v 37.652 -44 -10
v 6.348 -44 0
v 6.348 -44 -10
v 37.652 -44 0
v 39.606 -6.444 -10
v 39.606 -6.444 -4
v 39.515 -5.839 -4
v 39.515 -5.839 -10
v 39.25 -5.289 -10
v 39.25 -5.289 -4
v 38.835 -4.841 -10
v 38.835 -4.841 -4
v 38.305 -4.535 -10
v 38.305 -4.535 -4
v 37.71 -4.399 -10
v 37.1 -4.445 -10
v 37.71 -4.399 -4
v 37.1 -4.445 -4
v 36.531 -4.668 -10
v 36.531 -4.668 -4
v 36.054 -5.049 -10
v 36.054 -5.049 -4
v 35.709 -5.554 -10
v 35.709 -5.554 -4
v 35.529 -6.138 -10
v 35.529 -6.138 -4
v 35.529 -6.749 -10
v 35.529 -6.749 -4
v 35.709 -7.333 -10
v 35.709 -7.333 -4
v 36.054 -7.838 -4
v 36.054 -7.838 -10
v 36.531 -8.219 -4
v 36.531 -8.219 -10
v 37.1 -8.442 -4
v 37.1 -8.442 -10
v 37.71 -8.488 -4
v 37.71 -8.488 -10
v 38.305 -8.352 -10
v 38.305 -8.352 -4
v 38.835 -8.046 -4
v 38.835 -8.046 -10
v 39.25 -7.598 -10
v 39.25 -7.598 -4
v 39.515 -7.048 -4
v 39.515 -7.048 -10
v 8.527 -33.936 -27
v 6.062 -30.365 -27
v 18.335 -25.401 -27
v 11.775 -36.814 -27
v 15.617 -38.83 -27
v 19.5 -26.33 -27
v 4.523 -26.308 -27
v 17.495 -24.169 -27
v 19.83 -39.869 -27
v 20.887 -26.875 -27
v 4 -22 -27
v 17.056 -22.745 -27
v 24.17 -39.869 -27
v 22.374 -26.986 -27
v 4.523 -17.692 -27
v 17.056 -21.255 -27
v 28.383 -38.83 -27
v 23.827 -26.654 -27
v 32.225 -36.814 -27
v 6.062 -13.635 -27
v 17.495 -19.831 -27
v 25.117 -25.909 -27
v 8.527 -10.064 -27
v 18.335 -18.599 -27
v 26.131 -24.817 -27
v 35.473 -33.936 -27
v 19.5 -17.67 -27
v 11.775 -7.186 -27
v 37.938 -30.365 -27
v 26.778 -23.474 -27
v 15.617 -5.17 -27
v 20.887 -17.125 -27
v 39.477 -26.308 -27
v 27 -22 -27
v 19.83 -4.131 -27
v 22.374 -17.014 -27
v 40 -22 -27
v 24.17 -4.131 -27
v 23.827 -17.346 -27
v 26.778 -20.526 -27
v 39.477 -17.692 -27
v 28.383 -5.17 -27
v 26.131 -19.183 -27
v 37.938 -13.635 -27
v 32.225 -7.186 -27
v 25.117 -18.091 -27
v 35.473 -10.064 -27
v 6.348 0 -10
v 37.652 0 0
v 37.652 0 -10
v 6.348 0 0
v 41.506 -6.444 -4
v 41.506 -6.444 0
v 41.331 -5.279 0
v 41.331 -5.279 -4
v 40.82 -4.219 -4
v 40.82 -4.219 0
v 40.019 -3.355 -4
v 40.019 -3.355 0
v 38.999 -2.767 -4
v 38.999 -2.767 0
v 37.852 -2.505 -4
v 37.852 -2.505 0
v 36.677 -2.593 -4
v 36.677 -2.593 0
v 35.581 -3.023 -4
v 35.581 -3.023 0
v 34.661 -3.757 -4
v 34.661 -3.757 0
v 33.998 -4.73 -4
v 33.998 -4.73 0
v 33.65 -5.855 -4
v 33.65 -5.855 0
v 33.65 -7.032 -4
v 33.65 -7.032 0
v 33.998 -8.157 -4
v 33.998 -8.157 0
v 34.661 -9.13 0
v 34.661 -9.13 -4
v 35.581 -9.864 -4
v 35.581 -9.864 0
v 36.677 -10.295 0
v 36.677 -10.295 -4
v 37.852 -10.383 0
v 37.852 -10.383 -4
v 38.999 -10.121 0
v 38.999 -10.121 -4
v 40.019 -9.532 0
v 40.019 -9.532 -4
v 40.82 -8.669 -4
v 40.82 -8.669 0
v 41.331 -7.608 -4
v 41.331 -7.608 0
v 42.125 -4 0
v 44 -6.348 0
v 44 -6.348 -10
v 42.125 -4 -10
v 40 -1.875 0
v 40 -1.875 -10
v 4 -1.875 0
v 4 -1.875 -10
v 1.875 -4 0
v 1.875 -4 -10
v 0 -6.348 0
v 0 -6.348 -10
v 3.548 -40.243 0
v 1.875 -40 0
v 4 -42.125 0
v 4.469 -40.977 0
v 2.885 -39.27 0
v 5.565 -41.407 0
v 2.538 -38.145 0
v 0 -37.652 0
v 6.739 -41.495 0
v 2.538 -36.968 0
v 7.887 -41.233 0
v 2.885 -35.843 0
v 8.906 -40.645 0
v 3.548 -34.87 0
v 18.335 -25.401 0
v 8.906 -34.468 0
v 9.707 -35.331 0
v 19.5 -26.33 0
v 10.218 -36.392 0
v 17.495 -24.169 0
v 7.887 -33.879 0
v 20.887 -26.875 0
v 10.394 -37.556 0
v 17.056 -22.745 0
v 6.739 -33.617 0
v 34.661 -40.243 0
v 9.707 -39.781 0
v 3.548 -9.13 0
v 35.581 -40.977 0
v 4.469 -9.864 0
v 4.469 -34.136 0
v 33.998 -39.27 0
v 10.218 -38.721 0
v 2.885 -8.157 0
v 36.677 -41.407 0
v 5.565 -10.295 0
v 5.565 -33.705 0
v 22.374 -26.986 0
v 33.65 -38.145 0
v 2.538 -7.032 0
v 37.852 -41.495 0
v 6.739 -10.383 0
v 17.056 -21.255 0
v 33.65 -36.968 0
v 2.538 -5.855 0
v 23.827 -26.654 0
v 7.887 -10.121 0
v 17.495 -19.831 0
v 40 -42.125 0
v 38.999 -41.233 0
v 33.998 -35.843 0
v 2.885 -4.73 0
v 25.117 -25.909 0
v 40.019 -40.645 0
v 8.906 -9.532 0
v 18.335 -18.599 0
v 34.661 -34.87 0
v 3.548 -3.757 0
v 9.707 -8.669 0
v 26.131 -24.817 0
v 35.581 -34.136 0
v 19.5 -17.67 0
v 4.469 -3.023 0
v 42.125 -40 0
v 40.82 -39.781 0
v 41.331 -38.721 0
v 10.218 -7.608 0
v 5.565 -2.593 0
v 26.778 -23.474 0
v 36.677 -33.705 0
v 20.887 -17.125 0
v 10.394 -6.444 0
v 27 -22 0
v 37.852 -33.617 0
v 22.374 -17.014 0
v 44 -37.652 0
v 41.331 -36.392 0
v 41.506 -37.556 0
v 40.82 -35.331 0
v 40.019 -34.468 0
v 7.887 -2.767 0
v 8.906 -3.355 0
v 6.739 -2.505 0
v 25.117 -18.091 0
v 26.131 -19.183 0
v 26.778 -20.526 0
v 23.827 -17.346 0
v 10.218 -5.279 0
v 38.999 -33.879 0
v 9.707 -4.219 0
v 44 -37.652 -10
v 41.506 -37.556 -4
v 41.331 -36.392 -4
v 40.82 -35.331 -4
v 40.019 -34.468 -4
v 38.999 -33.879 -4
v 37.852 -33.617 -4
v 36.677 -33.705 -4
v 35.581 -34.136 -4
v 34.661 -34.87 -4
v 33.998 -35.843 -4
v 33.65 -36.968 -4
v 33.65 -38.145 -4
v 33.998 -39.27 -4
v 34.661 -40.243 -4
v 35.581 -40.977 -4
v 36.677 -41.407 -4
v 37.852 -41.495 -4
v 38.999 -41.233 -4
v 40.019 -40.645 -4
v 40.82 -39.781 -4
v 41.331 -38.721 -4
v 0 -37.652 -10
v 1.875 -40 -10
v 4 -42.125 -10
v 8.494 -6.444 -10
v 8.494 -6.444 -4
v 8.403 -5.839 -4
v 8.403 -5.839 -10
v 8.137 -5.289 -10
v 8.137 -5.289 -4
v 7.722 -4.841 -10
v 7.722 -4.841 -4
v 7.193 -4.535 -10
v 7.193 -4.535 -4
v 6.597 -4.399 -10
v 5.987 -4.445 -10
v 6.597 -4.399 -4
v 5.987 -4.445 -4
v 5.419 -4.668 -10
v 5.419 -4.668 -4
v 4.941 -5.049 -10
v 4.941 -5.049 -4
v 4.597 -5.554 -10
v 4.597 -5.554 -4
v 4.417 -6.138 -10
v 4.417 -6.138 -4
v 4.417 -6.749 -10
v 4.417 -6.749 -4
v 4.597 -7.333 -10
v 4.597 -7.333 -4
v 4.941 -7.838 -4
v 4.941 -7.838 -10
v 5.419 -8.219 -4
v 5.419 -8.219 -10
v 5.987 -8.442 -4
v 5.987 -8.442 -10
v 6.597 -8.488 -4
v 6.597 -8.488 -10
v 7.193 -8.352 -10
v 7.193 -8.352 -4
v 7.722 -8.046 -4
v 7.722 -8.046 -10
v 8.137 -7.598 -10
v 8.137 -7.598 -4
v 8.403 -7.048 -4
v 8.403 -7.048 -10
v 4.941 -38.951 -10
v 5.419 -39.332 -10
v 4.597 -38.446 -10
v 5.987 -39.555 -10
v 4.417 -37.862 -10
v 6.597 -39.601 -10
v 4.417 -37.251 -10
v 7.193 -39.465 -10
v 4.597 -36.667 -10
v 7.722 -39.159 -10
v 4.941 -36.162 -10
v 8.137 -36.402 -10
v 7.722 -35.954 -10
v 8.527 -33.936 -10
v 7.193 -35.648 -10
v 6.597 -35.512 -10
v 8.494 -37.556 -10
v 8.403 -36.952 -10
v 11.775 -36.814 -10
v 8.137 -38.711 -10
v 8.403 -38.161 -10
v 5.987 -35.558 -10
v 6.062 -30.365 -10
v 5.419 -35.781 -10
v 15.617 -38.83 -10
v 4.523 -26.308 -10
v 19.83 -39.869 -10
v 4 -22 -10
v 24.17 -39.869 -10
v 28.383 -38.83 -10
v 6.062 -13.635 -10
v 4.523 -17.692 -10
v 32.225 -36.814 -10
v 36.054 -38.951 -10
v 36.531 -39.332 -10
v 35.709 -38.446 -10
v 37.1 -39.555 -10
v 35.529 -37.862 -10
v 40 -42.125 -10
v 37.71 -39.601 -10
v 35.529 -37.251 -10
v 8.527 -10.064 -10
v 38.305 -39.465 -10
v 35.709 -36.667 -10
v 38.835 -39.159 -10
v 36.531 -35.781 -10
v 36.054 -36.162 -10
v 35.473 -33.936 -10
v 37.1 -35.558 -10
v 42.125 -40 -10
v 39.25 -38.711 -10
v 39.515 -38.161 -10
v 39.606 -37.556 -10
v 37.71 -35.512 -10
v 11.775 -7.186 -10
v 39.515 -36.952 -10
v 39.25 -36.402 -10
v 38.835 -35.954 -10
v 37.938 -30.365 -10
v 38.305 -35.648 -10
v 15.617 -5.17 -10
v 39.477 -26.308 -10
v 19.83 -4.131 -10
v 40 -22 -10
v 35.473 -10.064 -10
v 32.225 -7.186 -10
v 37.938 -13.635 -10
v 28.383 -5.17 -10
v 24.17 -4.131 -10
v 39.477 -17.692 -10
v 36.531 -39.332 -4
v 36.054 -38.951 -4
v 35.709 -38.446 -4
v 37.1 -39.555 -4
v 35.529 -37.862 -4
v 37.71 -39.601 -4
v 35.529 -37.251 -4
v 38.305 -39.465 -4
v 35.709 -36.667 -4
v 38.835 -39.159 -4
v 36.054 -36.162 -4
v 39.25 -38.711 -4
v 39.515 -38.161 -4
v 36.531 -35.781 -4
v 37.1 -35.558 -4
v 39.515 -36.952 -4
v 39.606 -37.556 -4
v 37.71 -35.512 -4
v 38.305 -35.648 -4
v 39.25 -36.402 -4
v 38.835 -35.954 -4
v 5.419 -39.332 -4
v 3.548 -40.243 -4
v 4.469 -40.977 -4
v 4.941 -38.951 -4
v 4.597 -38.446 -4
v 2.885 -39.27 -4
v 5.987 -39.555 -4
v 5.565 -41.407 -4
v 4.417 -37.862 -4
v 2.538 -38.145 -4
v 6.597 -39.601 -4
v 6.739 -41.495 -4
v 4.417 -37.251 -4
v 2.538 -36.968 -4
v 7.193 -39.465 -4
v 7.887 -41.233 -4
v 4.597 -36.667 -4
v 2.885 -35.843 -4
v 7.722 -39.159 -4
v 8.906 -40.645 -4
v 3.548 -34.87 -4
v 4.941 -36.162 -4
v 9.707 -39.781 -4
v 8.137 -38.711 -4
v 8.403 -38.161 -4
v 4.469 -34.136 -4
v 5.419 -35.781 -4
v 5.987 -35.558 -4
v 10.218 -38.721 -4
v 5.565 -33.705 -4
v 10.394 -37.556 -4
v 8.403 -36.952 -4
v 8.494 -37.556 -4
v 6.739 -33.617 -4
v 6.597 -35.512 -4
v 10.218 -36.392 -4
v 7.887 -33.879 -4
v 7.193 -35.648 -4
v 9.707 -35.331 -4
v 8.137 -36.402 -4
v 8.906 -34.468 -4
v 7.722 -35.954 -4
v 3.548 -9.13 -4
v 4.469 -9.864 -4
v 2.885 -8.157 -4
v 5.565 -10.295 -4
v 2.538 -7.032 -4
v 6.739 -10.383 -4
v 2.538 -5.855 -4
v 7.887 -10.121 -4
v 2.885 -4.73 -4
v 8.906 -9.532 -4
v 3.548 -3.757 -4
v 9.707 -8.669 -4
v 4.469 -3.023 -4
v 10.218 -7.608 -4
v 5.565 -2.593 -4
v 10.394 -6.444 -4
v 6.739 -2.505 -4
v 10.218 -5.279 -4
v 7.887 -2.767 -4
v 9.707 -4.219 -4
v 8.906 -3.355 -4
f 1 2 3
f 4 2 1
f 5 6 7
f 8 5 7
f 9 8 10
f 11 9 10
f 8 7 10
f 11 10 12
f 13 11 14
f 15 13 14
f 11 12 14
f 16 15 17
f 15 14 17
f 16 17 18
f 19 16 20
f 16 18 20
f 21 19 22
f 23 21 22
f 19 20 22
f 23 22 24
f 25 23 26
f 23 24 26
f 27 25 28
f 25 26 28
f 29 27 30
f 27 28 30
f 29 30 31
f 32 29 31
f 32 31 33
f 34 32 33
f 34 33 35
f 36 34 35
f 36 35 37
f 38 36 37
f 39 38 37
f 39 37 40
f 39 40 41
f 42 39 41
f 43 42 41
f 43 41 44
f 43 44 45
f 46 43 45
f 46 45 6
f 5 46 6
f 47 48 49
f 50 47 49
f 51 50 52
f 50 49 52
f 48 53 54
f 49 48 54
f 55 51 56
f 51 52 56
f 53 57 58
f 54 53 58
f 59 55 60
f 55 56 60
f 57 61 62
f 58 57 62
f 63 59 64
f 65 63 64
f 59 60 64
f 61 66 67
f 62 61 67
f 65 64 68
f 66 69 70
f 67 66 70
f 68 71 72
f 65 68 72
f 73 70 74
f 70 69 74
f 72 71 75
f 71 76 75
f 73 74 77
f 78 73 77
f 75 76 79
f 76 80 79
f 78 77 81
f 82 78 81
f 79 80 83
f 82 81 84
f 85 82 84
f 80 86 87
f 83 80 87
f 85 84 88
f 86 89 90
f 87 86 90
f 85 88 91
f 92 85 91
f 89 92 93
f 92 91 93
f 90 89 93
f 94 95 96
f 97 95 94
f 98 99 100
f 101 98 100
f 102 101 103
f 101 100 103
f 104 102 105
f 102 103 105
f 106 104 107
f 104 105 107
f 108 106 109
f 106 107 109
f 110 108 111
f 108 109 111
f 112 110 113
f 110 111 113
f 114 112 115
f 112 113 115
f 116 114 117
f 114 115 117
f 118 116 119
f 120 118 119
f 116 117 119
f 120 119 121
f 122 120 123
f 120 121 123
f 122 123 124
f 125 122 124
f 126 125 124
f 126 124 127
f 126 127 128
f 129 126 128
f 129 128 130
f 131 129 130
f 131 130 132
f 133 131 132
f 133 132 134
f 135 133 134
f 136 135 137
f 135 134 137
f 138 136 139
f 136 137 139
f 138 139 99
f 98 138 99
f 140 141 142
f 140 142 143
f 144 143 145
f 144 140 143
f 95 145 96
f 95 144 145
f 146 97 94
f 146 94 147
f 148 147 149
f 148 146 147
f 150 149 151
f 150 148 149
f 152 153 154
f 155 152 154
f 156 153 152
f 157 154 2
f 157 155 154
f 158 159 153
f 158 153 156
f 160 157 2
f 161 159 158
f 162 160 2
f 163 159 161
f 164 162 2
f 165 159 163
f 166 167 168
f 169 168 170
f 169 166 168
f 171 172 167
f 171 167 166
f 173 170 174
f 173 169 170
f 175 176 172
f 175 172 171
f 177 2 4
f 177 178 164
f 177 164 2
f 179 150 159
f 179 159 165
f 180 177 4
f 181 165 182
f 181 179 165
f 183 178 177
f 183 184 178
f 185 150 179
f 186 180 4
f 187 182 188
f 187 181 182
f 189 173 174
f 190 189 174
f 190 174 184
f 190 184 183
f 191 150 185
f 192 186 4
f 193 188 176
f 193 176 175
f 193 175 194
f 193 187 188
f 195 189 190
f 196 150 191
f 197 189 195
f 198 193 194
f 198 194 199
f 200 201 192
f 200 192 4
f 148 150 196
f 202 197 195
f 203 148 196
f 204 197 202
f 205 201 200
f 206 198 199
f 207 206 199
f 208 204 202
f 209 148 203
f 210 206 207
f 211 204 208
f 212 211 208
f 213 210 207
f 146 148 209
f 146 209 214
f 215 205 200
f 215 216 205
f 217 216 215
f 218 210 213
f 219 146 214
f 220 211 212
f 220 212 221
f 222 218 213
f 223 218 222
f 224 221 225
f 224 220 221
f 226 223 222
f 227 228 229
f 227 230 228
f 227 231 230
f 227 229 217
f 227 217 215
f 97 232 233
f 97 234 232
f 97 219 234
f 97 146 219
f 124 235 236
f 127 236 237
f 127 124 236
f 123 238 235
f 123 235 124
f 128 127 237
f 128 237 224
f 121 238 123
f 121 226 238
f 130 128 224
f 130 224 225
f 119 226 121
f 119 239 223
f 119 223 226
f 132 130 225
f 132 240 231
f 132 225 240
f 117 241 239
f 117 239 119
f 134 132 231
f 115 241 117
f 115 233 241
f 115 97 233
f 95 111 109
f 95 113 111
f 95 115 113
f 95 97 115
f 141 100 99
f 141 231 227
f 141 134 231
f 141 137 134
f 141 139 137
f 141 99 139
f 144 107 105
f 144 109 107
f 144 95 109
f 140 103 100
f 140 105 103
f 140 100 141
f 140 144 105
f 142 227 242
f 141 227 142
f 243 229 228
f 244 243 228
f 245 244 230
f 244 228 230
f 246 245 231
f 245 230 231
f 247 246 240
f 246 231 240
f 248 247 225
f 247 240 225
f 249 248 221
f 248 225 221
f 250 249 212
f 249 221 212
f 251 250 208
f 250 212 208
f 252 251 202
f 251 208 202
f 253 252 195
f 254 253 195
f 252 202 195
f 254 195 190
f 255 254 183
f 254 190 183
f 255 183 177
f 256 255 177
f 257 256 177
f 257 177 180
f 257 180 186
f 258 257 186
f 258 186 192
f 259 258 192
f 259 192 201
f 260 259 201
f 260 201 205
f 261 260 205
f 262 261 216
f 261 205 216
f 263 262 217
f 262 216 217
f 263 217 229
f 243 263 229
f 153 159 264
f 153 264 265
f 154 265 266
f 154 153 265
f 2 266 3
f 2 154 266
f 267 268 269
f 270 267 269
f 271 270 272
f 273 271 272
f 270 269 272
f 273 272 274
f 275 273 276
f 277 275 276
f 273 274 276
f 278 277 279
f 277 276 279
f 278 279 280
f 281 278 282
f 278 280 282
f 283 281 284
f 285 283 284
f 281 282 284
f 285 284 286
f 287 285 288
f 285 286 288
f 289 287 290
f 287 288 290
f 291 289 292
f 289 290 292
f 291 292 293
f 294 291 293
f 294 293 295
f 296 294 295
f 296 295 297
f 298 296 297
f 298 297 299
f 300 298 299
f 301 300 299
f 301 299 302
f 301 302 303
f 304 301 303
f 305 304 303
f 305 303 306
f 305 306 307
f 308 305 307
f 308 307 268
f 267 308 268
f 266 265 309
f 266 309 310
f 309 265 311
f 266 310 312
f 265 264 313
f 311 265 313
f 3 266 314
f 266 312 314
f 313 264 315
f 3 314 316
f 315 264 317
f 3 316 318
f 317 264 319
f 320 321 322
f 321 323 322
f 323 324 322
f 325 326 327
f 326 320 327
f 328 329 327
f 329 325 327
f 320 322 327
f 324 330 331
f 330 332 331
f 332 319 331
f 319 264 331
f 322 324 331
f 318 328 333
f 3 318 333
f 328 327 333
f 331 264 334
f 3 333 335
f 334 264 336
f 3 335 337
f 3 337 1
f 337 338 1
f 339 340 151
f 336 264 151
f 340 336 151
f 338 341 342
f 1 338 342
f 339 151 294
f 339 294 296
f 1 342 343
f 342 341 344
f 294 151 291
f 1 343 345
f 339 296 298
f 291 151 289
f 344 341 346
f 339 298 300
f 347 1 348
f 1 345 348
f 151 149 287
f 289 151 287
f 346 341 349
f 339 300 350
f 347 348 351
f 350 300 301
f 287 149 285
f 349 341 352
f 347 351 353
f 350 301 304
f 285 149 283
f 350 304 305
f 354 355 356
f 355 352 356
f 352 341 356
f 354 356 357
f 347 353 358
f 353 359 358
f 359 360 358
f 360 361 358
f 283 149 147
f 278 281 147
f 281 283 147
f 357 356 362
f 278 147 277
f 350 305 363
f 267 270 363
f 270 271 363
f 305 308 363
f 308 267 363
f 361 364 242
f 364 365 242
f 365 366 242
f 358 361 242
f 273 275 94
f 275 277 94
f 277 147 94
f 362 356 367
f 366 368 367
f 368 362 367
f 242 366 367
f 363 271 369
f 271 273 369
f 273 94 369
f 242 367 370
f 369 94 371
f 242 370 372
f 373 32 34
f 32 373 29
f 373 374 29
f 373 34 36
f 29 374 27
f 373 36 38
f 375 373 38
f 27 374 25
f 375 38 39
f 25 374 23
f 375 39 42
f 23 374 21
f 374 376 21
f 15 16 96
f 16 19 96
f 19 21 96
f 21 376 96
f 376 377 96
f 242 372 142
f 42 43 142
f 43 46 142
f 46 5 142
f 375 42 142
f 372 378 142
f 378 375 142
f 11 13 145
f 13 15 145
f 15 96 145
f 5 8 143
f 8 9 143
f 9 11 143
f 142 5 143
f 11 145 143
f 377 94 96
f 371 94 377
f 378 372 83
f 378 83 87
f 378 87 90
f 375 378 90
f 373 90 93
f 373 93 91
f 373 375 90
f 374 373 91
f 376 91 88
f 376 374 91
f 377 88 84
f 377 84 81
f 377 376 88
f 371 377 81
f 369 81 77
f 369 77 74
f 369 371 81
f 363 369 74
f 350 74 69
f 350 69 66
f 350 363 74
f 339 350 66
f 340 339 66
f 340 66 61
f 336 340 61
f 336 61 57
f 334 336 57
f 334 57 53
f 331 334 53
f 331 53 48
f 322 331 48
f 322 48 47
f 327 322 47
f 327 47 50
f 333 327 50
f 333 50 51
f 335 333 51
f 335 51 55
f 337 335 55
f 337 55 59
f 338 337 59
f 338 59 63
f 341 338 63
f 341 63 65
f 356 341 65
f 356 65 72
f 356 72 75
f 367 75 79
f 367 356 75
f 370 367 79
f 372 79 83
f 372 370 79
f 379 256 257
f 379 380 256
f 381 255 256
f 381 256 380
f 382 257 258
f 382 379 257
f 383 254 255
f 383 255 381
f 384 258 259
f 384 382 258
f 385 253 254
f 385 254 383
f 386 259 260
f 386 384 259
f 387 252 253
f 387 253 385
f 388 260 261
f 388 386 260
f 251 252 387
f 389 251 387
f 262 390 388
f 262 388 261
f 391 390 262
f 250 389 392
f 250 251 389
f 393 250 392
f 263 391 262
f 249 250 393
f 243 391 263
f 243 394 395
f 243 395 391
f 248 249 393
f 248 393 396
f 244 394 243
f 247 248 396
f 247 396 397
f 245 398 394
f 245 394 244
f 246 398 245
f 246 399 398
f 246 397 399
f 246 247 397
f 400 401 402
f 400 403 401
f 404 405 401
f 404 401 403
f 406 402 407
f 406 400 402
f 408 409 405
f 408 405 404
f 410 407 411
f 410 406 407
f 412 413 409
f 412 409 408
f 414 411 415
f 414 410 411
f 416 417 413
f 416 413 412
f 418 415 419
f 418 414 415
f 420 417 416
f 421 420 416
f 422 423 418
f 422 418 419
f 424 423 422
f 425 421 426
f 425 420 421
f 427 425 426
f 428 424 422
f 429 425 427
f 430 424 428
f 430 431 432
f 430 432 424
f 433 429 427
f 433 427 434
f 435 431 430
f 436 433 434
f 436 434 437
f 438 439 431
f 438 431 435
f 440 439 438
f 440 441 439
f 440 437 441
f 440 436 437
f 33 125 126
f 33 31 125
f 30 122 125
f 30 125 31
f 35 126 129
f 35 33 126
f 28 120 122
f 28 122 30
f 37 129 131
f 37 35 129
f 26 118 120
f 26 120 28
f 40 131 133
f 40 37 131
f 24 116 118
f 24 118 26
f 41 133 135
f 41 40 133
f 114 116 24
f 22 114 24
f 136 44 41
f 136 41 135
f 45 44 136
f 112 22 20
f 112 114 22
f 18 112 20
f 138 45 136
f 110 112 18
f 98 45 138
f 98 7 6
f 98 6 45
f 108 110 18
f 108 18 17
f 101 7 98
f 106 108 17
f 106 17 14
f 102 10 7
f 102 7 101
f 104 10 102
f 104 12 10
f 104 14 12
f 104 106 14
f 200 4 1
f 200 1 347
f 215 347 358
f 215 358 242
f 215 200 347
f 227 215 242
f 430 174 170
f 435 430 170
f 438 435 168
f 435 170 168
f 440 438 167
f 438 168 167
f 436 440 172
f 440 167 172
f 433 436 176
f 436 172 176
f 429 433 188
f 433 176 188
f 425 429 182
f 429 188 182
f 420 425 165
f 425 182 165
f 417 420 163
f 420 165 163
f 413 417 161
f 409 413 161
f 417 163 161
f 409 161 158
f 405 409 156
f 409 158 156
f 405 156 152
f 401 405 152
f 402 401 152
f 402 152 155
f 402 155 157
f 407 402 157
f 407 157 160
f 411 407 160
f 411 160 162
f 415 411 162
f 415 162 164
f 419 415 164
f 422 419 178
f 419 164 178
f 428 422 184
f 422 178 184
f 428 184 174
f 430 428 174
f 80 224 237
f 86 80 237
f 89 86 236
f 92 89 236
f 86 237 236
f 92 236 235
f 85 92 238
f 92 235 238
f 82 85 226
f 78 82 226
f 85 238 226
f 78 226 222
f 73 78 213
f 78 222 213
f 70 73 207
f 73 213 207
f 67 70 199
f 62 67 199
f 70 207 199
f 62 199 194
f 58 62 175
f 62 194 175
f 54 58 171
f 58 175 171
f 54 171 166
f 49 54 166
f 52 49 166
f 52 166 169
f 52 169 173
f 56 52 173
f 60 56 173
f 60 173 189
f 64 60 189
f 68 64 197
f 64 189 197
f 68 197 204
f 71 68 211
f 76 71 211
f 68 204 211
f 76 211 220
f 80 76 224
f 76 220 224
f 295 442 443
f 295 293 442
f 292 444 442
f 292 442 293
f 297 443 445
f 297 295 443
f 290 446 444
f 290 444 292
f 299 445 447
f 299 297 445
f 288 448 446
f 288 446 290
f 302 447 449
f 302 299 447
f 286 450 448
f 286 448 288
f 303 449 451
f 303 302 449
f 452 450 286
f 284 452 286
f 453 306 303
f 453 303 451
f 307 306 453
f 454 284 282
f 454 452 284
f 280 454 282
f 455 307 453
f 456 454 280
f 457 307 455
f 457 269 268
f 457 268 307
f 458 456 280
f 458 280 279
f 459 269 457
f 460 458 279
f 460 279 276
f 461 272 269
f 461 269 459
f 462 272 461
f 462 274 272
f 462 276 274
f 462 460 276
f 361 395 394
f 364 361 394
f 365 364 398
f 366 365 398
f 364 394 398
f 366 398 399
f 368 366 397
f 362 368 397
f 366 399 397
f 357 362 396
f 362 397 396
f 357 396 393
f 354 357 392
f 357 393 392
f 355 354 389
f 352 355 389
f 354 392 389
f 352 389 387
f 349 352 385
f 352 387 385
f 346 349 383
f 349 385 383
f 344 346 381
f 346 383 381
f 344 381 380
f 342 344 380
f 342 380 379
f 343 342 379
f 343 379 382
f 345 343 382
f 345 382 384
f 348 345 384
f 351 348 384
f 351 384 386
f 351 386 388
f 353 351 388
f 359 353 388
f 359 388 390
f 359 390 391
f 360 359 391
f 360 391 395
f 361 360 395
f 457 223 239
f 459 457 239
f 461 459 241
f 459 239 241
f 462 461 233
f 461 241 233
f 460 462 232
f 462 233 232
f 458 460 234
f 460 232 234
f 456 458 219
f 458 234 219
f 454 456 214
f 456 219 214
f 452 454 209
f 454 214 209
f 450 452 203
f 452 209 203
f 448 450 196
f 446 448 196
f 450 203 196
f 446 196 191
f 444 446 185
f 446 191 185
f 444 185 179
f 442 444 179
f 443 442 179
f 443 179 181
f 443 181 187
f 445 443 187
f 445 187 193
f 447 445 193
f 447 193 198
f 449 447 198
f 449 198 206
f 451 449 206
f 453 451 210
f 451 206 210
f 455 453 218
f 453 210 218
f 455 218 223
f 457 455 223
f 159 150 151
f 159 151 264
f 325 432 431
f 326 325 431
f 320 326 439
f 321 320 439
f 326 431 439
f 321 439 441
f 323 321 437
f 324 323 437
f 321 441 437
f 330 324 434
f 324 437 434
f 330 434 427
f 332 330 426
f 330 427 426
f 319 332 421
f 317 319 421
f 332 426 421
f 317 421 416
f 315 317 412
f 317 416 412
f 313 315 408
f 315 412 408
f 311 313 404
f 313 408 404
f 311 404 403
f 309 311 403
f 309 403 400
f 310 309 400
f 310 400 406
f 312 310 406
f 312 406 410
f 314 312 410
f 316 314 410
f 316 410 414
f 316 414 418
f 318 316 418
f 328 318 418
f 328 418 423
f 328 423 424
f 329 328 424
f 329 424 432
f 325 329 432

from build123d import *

# Parameters (mm, degrees)
F0_R     = 18
F0_R_2   = 5
F1_DEPTH = 27
F0_R_3   = 3.95
F0_R_4   = 2.05
F2_DEPTH = 10
F3_DEPTH = 4


with BuildPart() as f1:
    # F0 (on Top) → F1 (new body)
    with BuildSketch(Plane.XY):
        with Locations((22, -22)):
            Circle(F0_R)
        with Locations((22, -22)):
            Circle(F0_R_2, mode=Mode.SUBTRACT)
    extrude(amount=-F1_DEPTH)

    # F0 (on Top) → F2 (join)
    with BuildSketch(Plane.XY):
        with BuildLine():
            Line((37.652476, 0), (6.347524, 0))
            ThreePointArc((6.347524, 0), (2.908117, -2.908117), (0, -6.347524))
            Line((0, -6.347524), (0, -37.652476))
            ThreePointArc((0, -37.652476), (2.908117, -41.091883), (6.347524, -44))
            Line((6.347524, -44), (37.652476, -44))
            ThreePointArc((37.652476, -44), (41.091883, -41.091883), (44, -37.652476))
            Line((44, -37.652476), (44, -6.347524))
            ThreePointArc((44, -6.347524), (41.091883, -2.908117), (37.652476, 0))
        make_face()
        with Locations((6.443651, -37.556349)):
            Circle(F0_R_3, mode=Mode.SUBTRACT)
        with Locations((37.556349, -37.556349)):
            Circle(F0_R_3, mode=Mode.SUBTRACT)
        with Locations((6.443651, -6.443651)):
            Circle(F0_R_3, mode=Mode.SUBTRACT)
        with Locations((22, -22)):
            Circle(F0_R, mode=Mode.SUBTRACT)
        with Locations((37.556349, -6.443651)):
            Circle(F0_R_3, mode=Mode.SUBTRACT)
        with Locations((6.443651, -6.443651)):
            Circle(F0_R_3)
        with Locations((6.443651, -6.443651)):
            Circle(F0_R_4, mode=Mode.SUBTRACT)
        with Locations((37.556349, -6.443651)):
            Circle(F0_R_3)
        with Locations((37.556349, -6.443651)):
            Circle(F0_R_4, mode=Mode.SUBTRACT)
        with Locations((37.556349, -37.556349)):
            Circle(F0_R_3)
        with Locations((37.556349, -37.556349)):
            Circle(F0_R_4, mode=Mode.SUBTRACT)
        with Locations((6.443651, -37.556349)):
            Circle(F0_R_3)
        with Locations((6.443651, -37.556349)):
            Circle(F0_R_4, mode=Mode.SUBTRACT)
    extrude(amount=-F2_DEPTH)

    # F0 (on Top) → F3 (cut)
    with BuildSketch(Plane.XY):
        with Locations((6.443651, -6.443651)):
            Circle(F0_R_3)
        with Locations((6.443651, -6.443651)):
            Circle(F0_R_4, mode=Mode.SUBTRACT)
        with Locations((37.556349, -6.443651)):
            Circle(F0_R_3)
        with Locations((37.556349, -6.443651)):
            Circle(F0_R_4, mode=Mode.SUBTRACT)
        with Locations((37.556349, -37.556349)):
            Circle(F0_R_3)
        with Locations((37.556349, -37.556349)):
            Circle(F0_R_4, mode=Mode.SUBTRACT)
        with Locations((6.443651, -37.556349)):
            Circle(F0_R_3)
        with Locations((6.443651, -37.556349)):
            Circle(F0_R_4, mode=Mode.SUBTRACT)
    extrude(amount=-F3_DEPTH, mode=Mode.SUBTRACT)


solid = f1.part
